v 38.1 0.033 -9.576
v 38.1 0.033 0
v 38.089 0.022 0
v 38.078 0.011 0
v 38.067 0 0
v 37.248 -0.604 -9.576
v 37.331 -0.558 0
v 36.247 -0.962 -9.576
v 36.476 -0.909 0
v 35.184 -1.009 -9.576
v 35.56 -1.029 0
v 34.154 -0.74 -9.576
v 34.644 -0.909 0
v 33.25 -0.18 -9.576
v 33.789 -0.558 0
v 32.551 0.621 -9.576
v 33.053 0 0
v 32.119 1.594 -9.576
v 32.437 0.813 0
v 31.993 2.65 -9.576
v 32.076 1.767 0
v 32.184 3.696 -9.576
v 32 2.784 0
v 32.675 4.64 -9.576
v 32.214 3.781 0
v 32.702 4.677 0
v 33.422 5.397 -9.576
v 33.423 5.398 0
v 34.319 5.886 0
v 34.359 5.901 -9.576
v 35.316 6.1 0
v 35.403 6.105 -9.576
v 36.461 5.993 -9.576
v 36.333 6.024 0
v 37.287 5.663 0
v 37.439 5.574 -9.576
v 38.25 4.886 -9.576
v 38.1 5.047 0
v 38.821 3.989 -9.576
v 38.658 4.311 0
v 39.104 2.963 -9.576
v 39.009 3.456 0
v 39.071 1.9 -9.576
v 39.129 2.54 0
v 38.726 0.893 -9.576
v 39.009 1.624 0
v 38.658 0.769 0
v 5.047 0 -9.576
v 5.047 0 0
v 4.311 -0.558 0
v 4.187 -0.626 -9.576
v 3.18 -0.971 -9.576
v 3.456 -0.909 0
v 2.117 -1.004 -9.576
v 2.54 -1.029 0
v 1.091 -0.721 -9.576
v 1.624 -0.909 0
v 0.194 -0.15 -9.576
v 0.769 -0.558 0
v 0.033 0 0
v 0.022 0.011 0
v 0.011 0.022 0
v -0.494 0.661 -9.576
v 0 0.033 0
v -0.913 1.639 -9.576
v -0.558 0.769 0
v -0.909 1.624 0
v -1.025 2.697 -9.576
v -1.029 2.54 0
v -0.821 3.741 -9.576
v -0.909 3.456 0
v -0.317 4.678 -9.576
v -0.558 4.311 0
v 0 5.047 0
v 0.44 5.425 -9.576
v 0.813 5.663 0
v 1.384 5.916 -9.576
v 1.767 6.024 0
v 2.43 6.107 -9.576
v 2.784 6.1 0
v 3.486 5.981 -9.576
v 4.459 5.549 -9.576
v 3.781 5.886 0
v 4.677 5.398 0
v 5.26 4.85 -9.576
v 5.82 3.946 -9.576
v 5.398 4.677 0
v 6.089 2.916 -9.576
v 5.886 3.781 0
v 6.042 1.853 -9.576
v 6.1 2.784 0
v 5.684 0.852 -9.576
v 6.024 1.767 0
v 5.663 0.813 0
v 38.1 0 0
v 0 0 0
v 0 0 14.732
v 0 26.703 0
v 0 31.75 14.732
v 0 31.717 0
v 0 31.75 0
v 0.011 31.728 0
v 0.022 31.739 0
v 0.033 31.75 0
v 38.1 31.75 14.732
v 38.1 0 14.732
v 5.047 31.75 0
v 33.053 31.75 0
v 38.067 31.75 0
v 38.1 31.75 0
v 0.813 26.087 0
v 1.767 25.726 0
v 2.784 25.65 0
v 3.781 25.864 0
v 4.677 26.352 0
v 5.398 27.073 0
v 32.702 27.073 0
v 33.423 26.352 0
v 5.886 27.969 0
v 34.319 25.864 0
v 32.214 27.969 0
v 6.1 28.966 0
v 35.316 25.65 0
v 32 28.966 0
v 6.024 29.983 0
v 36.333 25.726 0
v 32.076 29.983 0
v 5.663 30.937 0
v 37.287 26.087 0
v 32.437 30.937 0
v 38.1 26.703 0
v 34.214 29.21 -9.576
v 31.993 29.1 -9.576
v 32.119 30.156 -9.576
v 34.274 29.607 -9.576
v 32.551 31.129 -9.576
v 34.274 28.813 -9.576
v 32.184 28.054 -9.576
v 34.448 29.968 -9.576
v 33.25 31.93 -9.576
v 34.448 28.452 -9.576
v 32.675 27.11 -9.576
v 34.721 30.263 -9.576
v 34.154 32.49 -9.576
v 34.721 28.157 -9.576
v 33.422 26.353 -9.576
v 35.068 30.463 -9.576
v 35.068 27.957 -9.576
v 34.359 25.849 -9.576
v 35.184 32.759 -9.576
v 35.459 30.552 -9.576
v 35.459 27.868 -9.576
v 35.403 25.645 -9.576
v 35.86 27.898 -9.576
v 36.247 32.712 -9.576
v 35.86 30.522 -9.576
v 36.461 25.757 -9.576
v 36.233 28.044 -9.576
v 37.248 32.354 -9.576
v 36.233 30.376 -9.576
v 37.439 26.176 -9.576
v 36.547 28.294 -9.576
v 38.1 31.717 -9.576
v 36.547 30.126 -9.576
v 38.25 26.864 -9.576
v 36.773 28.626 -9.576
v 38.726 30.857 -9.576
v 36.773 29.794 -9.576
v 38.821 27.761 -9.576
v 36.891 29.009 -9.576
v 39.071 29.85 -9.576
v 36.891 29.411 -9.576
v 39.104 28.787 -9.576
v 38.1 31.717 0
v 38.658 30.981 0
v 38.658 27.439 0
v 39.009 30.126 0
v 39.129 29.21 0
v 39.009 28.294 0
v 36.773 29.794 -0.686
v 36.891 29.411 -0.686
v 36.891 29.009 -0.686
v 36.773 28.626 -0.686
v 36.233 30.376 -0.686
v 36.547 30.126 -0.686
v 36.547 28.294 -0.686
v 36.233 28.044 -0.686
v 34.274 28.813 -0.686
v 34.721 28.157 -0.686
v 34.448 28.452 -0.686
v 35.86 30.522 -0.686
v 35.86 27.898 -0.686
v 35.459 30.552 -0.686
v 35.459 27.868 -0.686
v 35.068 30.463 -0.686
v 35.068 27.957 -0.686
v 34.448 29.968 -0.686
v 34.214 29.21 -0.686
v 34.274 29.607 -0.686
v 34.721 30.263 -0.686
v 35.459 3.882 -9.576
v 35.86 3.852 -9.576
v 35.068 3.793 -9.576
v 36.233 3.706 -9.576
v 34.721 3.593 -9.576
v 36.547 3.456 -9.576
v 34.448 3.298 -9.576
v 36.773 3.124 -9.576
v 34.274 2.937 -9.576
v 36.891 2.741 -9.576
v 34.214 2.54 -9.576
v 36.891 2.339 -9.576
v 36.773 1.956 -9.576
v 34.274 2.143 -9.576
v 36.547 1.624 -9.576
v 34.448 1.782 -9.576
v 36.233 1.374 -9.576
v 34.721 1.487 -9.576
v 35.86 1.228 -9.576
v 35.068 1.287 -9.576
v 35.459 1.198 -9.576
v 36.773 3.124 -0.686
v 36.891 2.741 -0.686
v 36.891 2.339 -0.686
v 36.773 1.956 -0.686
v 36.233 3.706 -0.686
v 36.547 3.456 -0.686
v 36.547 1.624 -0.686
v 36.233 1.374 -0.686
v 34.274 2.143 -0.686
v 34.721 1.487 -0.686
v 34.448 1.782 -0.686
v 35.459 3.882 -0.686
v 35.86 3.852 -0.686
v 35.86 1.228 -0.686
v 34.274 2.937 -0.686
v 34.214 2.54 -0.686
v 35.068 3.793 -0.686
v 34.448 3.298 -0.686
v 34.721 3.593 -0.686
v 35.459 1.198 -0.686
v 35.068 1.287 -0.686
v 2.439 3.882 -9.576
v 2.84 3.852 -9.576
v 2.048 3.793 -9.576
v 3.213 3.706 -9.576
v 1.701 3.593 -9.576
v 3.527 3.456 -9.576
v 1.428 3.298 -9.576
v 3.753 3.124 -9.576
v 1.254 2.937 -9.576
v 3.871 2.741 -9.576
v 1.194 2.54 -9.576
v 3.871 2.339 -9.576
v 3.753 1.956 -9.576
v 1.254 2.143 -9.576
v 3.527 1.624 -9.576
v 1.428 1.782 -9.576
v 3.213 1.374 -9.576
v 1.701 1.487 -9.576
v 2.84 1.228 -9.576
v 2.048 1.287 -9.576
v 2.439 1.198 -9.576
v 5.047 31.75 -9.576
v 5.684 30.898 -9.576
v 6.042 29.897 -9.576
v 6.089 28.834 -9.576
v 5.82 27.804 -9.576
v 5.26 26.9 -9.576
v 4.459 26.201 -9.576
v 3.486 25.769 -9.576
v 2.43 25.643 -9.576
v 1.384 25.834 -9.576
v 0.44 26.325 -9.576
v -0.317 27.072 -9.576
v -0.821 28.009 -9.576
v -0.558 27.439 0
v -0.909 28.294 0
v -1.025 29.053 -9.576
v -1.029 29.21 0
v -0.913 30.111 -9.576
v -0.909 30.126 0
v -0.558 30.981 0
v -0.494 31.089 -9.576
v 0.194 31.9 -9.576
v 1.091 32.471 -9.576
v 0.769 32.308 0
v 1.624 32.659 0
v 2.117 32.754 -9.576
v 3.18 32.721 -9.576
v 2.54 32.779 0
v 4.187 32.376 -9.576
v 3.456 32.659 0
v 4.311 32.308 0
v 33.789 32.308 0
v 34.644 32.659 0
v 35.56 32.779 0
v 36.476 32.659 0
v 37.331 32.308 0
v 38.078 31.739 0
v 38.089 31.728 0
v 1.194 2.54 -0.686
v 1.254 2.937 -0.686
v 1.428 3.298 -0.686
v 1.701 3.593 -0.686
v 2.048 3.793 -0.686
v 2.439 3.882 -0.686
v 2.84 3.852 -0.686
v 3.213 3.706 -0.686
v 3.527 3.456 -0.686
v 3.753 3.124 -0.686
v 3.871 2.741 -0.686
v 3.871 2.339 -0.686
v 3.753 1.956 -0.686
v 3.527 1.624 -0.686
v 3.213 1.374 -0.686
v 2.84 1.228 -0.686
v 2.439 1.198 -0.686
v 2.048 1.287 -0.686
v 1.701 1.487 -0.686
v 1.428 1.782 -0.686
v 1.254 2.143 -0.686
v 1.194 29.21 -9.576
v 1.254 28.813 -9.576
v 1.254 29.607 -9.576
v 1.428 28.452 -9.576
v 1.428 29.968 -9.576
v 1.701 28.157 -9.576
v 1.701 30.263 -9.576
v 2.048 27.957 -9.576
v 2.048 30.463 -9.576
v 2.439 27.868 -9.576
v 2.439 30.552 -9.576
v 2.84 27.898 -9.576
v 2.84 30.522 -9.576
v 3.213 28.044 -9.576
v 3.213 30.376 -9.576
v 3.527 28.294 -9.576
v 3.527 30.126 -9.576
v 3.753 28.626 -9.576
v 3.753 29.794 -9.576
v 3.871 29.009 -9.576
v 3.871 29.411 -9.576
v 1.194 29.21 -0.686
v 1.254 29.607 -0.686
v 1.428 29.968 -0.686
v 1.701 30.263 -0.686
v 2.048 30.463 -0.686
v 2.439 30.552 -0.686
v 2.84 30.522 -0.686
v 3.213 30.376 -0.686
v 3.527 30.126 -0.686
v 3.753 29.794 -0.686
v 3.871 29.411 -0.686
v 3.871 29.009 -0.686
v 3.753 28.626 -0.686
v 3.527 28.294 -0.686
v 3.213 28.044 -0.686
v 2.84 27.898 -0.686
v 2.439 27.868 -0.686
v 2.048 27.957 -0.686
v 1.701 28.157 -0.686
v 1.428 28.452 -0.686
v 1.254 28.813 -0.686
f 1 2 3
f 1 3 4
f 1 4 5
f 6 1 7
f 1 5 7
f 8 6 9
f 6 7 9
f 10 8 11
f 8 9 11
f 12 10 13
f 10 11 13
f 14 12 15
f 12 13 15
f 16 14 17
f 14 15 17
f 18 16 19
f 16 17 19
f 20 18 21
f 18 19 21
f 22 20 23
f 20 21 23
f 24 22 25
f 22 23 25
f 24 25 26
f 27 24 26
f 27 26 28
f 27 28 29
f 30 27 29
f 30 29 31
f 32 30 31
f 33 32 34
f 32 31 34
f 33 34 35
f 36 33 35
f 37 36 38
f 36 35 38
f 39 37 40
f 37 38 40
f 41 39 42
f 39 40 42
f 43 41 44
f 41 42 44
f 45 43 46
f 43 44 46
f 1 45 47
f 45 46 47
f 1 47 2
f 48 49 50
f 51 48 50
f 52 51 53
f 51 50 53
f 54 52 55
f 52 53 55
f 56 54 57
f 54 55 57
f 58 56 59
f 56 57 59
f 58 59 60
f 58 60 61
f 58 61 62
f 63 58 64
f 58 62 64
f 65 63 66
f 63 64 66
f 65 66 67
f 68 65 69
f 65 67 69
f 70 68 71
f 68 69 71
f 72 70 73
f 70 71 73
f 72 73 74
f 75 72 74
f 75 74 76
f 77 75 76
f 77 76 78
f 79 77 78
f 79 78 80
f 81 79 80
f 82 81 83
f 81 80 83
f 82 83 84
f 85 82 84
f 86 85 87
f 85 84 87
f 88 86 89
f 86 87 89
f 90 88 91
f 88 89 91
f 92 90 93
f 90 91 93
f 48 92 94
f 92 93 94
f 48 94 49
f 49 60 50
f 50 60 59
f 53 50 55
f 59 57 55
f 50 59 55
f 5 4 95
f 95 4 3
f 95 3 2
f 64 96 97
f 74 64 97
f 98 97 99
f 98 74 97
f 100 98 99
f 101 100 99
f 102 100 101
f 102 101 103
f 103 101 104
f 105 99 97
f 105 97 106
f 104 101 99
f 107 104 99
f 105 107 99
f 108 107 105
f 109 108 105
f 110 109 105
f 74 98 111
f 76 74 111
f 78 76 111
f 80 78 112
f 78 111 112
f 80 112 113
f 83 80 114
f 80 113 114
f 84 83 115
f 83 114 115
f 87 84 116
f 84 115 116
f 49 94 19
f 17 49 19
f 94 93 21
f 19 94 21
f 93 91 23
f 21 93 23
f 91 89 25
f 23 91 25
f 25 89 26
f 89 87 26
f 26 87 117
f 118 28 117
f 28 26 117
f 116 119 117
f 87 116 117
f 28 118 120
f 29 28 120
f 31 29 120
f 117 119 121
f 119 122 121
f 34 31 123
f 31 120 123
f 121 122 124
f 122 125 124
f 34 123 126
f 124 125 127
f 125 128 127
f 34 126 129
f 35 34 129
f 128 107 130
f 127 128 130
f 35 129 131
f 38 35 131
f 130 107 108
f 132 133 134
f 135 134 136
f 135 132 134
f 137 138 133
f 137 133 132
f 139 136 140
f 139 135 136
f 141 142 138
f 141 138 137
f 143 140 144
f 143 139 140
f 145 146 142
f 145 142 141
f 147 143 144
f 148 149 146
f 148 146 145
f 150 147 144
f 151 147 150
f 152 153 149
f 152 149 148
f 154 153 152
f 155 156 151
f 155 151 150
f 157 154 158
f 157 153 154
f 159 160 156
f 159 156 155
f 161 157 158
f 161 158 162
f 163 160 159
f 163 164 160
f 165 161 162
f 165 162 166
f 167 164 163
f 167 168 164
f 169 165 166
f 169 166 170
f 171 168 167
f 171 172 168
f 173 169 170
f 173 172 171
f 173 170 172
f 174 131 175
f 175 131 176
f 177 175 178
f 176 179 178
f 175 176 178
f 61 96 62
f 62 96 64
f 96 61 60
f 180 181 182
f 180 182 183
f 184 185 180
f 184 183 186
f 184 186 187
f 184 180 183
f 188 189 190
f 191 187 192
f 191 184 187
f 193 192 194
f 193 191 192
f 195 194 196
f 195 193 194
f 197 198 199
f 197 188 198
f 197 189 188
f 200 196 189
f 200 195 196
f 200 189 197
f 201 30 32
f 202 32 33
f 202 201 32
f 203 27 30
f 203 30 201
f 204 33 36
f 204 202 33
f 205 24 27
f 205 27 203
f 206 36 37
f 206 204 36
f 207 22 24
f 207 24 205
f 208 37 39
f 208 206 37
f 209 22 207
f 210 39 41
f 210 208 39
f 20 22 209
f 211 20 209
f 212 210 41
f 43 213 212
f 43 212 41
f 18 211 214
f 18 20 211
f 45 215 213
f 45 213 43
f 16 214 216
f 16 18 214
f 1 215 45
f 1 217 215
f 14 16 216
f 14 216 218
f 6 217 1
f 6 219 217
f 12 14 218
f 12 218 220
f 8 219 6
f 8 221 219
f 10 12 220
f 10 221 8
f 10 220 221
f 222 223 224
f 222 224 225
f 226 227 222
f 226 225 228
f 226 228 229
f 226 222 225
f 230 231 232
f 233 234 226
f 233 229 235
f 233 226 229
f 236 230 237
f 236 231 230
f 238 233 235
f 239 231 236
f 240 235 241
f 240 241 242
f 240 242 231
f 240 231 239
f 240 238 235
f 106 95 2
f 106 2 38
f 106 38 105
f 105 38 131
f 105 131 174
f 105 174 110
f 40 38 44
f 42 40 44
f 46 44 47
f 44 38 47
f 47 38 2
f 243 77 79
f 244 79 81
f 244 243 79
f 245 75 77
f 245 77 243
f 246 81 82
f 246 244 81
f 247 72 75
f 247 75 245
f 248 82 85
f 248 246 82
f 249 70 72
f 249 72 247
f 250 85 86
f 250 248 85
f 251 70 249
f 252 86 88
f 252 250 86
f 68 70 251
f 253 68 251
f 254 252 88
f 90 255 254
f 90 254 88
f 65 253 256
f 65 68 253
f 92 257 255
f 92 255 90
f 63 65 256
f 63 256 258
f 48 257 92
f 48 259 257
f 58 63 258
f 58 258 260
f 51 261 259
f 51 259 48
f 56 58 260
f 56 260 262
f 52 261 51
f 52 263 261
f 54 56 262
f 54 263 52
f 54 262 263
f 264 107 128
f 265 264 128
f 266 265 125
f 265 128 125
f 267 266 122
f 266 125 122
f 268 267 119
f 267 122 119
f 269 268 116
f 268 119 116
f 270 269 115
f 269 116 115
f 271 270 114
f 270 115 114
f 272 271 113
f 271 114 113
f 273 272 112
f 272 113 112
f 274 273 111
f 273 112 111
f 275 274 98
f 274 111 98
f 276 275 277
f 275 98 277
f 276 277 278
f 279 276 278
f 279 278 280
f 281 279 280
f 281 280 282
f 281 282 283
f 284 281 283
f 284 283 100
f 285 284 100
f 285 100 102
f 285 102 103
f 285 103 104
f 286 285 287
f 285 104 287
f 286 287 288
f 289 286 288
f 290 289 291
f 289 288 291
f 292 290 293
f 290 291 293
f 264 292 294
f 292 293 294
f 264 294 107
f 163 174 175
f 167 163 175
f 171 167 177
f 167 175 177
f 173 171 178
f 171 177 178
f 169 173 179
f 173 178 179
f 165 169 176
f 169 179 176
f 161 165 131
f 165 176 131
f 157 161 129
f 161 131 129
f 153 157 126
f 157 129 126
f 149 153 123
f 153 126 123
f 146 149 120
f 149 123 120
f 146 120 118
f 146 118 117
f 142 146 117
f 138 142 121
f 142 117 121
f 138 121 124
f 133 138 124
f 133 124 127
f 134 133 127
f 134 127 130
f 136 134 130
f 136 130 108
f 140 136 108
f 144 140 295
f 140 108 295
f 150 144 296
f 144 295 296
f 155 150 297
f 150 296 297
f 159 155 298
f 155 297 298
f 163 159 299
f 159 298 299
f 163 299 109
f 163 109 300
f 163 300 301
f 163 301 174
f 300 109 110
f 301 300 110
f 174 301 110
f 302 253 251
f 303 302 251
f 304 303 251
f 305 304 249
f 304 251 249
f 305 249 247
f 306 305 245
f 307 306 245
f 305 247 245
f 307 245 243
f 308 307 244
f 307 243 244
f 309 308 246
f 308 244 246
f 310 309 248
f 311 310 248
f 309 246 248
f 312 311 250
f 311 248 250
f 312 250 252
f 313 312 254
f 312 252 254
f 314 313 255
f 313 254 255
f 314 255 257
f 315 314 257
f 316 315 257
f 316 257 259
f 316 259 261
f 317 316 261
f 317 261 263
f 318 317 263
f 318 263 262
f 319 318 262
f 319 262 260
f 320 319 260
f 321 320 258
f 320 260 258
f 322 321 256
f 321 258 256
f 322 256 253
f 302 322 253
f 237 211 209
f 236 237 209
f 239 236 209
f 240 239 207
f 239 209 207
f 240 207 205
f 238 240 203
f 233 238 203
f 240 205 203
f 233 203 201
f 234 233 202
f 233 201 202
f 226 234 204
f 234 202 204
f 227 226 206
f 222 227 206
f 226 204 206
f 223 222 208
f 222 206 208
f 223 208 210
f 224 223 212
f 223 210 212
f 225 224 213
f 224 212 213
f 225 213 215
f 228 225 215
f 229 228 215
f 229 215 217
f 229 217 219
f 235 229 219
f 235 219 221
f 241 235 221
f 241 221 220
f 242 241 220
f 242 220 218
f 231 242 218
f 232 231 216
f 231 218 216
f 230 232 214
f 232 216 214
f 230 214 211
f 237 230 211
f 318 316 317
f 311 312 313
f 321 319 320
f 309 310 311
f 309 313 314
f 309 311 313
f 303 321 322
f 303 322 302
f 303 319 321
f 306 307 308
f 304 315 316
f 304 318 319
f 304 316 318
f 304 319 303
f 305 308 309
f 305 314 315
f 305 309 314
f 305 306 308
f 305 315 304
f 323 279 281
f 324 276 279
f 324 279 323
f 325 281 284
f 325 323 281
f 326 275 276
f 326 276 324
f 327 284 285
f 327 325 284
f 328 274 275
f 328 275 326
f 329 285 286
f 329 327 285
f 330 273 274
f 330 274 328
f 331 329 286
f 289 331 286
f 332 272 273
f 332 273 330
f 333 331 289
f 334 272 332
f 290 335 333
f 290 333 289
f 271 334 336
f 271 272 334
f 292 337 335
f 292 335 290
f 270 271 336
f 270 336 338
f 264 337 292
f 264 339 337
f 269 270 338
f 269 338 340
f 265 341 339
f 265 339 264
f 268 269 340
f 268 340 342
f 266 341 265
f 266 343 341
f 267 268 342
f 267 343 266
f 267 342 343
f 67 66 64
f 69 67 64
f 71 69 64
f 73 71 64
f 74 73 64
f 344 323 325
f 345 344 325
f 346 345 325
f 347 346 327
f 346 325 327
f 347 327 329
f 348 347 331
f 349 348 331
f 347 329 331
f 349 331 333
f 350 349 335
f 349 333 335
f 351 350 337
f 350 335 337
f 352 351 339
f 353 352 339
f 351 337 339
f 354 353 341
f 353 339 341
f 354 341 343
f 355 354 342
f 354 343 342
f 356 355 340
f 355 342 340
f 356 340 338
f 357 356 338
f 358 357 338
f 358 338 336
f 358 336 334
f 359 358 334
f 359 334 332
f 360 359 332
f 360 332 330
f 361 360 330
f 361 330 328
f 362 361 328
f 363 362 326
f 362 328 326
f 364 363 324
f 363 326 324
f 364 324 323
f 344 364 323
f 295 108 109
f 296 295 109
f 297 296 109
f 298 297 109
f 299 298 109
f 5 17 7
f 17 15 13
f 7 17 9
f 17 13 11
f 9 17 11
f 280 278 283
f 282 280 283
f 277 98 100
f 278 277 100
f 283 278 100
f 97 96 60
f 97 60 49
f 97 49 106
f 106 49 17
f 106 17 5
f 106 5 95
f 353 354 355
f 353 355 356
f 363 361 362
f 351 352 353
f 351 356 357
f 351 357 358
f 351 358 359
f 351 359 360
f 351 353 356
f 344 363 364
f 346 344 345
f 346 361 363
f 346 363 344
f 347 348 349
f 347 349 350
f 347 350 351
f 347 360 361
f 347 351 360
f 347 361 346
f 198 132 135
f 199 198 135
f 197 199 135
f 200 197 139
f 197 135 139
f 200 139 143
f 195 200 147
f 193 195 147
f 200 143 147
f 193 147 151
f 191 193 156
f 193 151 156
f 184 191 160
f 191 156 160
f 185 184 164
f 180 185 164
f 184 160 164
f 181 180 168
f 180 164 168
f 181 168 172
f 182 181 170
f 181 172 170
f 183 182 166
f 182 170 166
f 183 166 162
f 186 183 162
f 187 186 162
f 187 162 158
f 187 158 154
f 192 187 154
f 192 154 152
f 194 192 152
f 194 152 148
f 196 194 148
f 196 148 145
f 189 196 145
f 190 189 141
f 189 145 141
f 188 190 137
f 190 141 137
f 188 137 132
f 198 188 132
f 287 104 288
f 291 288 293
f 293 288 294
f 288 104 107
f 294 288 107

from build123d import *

# Parameters (mm, degrees)
SKETCH1_W           = 38.1
SKETCH1_H           = 31.75
BOSS_EXTRUDE1_DEPTH = 14.732
SKETCH2_R           = 3.5687
BOSS_EXTRUDE2_DEPTH = 9.5758
SKETCH3_R           = 1.3462
CUT_EXTRUDE1_DEPTH  = 8.89


with BuildPart() as part:
    # Sketch1 → Boss-Extrude1 (new body)
    with BuildSketch(Plane.XY):
        with Locations((19.05, 15.875)):
            Rectangle(SKETCH1_W, SKETCH1_H)
    extrude(amount=BOSS_EXTRUDE1_DEPTH)

    # Sketch2 → Boss-Extrude2 (add)
    with BuildSketch(Plane(origin=(0, 0, 0), x_dir=(-1, 0, 0), z_dir=(0, 0, -1))):
        with Locations(Location((-35.56, 2.54, 0), (0, 0, 224.623028882))):
            Circle(SKETCH2_R)
        with Locations(Location((-2.54, 2.54, 0), (0, 0, 225.376971118))):
            Circle(SKETCH2_R)
        with Locations(Location((-35.56, 29.21, 0), (0, 0, 135.376971118))):
            Circle(SKETCH2_R)
        with Locations(Location((-2.54, 29.21, 0), (0, 0, 134.623028882))):
            Circle(SKETCH2_R)
    extrude(amount=BOSS_EXTRUDE2_DEPTH)

    # Sketch3 → Cut-Extrude1 (cut)
    with BuildSketch(Plane(origin=(0, 0, -9.5758), x_dir=(-1, 0, 0), z_dir=(0, 0, -1))):
        with Locations((-35.56, 29.21)):
            Circle(SKETCH3_R)
        with Locations((-2.54, 29.21)):
            Circle(SKETCH3_R)
        with Locations((-2.54, 2.54)):
            Circle(SKETCH3_R)
        with Locations((-35.56, 2.54)):
            Circle(SKETCH3_R)
    extrude(amount=-CUT_EXTRUDE1_DEPTH, mode=Mode.SUBTRACT)


solid = part.part
